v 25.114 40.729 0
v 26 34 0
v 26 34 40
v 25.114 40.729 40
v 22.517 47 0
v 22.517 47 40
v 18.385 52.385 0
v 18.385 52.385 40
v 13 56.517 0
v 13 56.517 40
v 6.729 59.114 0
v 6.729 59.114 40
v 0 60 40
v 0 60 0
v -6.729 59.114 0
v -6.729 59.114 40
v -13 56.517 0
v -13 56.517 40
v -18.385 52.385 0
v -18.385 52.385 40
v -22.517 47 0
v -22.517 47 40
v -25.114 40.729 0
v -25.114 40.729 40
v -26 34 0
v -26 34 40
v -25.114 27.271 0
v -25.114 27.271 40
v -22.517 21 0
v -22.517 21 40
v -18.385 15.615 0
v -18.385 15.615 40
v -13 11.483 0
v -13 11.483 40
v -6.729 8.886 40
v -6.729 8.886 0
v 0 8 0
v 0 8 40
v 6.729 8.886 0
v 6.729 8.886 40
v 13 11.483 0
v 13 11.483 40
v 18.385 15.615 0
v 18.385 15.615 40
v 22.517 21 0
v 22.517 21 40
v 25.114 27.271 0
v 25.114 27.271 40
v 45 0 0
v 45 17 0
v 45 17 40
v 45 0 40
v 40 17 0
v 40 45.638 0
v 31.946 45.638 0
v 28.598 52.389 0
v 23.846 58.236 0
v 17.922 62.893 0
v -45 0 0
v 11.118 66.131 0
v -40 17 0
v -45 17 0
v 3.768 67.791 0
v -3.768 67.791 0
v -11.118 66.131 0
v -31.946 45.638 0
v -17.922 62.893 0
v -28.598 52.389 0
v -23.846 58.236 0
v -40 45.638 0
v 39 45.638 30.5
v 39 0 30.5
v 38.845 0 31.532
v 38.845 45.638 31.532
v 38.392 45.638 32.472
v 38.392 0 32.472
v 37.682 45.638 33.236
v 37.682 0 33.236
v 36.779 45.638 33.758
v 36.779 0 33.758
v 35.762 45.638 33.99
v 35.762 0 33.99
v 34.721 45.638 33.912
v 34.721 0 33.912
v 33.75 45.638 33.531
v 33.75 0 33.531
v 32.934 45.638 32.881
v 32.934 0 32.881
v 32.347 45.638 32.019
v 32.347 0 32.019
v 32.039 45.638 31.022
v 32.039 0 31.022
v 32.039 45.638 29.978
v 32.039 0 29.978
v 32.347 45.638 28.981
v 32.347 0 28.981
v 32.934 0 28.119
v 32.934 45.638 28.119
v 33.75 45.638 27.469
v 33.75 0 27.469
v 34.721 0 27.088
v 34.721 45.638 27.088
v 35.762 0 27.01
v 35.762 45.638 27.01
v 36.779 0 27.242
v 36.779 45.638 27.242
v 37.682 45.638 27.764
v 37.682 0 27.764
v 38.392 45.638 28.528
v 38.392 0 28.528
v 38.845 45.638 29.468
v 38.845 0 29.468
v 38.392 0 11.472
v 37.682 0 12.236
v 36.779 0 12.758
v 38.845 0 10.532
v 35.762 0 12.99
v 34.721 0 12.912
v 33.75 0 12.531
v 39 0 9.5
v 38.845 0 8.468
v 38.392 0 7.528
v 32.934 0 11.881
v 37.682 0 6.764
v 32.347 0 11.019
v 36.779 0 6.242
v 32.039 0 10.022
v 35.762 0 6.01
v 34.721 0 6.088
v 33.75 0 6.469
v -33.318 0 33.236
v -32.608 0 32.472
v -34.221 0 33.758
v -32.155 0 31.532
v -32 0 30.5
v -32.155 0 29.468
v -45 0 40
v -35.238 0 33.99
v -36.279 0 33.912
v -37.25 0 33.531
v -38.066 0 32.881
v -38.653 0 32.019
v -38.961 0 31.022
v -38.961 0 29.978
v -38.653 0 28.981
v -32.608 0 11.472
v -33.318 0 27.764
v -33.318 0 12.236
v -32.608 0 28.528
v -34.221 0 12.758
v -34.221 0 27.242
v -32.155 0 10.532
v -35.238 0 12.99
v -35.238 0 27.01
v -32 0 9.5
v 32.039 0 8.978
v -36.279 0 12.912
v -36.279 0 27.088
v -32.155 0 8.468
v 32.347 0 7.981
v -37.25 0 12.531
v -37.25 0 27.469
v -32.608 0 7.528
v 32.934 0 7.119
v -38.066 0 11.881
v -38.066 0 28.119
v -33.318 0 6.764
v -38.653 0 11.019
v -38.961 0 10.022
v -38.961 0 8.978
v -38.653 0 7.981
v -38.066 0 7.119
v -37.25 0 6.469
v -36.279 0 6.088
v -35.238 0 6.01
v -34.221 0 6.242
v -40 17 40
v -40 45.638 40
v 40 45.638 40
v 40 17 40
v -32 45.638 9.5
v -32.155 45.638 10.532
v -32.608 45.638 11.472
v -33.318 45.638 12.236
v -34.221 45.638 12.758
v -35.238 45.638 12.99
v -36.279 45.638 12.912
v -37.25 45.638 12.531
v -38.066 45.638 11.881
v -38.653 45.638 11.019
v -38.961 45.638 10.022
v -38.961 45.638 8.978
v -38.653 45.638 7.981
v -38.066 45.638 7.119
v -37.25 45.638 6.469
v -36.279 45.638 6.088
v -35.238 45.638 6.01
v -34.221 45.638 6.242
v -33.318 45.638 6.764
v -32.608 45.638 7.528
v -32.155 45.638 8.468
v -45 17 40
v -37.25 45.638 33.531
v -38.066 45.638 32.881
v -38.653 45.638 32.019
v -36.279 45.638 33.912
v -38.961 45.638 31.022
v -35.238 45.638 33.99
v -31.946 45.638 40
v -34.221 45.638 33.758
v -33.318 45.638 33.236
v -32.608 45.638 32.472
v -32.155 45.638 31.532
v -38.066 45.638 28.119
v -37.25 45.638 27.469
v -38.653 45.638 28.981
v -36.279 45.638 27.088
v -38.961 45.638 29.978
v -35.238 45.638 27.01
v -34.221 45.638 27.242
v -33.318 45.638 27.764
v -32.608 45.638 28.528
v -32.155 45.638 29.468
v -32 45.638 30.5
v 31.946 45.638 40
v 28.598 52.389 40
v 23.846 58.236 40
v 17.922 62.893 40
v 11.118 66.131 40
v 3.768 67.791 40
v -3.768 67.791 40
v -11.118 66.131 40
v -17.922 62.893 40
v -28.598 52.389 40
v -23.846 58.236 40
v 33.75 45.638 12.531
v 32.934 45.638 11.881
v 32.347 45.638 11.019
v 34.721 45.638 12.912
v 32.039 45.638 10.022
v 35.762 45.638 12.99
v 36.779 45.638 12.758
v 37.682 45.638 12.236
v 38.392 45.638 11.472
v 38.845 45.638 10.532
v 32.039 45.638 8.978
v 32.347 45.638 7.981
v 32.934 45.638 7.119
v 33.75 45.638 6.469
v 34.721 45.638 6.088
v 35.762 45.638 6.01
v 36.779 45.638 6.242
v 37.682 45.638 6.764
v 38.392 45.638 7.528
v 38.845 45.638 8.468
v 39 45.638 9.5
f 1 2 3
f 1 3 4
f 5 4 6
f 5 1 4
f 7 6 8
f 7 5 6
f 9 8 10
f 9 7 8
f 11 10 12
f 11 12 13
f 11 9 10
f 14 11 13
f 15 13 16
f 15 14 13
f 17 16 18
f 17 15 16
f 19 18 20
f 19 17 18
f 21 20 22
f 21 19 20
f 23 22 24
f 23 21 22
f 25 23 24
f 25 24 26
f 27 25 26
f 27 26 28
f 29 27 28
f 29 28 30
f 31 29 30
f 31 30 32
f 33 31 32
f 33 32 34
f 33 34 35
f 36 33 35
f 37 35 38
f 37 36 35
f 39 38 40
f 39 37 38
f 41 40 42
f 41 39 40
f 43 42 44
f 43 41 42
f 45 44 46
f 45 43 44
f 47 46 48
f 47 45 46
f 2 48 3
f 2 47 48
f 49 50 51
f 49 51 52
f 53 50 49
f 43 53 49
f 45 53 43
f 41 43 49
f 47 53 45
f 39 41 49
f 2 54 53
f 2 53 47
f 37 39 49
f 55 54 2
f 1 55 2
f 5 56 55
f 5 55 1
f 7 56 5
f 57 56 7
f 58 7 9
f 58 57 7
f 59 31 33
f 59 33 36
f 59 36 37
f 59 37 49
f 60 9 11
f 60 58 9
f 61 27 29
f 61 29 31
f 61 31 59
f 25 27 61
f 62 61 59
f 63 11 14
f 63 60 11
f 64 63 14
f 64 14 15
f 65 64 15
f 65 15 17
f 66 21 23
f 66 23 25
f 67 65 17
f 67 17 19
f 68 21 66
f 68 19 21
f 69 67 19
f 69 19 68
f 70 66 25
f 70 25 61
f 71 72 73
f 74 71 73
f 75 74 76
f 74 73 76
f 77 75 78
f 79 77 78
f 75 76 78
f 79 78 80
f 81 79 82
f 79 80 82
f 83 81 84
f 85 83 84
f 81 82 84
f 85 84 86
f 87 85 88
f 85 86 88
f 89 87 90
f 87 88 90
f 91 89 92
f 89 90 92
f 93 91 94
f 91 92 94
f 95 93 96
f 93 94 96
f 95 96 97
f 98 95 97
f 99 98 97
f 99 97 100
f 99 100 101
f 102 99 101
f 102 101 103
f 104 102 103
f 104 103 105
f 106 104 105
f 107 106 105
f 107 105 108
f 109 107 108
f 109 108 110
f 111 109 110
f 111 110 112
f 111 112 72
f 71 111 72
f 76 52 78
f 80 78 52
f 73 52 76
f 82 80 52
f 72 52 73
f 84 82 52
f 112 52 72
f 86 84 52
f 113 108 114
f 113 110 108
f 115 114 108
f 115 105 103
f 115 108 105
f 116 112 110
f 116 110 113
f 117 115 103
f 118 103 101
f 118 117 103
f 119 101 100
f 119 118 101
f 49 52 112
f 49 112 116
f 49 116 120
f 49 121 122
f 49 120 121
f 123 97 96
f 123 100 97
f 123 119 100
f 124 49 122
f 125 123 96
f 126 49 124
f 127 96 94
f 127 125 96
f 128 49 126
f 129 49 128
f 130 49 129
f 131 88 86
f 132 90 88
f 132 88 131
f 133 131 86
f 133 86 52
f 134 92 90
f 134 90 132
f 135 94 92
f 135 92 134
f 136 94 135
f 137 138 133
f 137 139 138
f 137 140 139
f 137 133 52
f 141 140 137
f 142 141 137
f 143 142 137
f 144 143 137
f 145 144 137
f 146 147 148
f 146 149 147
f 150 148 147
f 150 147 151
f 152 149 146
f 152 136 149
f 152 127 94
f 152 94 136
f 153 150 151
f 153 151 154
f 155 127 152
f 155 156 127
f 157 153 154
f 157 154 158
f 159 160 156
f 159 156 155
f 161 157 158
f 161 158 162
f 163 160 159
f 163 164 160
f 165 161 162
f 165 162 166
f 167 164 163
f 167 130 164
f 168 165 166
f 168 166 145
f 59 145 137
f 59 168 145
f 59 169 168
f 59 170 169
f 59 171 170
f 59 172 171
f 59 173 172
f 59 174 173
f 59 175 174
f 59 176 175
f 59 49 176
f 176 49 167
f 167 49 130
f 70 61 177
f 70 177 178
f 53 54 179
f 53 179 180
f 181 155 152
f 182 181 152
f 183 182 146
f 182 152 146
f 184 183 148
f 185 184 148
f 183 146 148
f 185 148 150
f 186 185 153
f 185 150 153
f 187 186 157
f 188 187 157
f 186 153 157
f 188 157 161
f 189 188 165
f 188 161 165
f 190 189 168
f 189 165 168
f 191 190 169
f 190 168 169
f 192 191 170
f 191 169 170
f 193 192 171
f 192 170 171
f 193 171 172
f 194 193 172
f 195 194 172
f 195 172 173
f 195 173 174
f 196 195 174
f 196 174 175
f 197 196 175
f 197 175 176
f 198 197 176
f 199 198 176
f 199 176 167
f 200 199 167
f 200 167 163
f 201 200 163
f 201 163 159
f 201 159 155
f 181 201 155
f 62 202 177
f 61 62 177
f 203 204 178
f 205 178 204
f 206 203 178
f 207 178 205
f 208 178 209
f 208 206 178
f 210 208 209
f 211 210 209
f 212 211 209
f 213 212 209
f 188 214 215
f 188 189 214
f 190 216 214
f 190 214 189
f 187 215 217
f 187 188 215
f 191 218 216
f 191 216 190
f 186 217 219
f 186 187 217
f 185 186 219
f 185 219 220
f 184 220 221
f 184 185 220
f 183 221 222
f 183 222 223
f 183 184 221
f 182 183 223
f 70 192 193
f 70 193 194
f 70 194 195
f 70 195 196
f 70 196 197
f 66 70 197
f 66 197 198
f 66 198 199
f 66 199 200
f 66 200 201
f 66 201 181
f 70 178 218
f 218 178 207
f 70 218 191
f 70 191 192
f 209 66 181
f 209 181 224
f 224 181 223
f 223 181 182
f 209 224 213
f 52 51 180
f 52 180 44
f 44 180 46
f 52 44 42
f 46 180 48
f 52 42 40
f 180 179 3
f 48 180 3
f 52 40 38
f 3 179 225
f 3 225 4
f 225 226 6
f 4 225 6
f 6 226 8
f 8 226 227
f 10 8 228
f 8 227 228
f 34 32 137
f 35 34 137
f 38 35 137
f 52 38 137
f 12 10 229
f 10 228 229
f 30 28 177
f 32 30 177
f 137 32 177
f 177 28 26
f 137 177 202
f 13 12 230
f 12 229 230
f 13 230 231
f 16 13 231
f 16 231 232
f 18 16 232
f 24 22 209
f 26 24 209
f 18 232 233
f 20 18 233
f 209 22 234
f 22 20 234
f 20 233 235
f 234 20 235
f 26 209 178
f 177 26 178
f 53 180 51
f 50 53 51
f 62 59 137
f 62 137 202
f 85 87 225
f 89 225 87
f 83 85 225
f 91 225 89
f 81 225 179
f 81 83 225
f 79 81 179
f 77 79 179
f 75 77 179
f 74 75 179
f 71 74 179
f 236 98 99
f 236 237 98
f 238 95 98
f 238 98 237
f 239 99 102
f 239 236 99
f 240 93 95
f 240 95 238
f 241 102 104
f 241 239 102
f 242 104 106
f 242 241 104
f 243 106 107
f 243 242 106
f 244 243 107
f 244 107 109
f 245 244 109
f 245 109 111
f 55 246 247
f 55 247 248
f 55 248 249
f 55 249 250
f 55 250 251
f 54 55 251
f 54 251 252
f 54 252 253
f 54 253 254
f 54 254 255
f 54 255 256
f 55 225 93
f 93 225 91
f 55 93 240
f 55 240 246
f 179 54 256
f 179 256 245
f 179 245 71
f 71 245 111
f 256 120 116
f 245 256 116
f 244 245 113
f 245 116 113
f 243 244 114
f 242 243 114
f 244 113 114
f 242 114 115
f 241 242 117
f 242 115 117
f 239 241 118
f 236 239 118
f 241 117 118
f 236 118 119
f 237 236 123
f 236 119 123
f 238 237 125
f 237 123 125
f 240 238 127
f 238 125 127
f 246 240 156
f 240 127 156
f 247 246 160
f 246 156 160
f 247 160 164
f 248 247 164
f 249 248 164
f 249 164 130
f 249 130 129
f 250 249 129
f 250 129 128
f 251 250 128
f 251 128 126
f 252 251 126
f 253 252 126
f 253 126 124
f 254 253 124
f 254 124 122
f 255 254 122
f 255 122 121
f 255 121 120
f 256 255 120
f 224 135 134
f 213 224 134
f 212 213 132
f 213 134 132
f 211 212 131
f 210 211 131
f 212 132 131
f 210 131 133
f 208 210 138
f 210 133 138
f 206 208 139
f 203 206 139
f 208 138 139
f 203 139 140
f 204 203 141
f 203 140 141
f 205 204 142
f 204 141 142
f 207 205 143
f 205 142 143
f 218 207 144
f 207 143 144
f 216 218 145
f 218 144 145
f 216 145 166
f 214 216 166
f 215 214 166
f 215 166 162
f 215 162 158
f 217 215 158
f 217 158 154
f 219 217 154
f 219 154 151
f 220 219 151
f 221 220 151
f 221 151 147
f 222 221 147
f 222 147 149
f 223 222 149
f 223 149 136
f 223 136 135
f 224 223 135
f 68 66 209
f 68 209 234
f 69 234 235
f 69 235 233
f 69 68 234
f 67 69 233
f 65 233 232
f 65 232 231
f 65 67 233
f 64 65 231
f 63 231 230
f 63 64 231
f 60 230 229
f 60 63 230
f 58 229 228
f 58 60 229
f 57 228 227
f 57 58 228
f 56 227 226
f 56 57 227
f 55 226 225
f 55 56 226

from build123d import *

# Parameters (mm, degrees)
SKETCH1_R           = 26
BOSS_EXTRUDE1_DEPTH = 40
SKETCH2_R           = 3.5
CUT_EXTRUDE1_DEPTH  = 100


with BuildPart() as part:
    # Sketch1 → Boss-Extrude1 (new body)
    with BuildSketch(Plane.XY):
        with BuildLine():
            Line((40, 17), (45, 17))
            Line((45, 17), (45, 0))
            Line((45, 0), (-45, 0))
            Line((-45, 0), (-45, 17))
            Line((-45, 17), (-40, 17))
            Line((-40, 17), (-40, 45.637906937))
            Line((-40, 45.637906937), (-31.946191042, 45.637906937))
            ThreePointArc((-31.946191042, 45.637906937), (0, 68), (31.946191042, 45.637906937))
            Line((31.946191042, 45.637906937), (40, 45.637906937))
            Line((40, 45.637906937), (40, 17))
        make_face()
        with Locations((0, 34)):
            Circle(SKETCH1_R, mode=Mode.SUBTRACT)
    extrude(amount=BOSS_EXTRUDE1_DEPTH)

    # Sketch2 → Cut-Extrude1 (cut)
    with BuildSketch(Plane.XZ):
        with Locations((-35.5, 30.5)):
            Circle(SKETCH2_R)
        with Locations((-35.5, 9.5)):
            Circle(SKETCH2_R)
        with Locations((35.5, 30.5)):
            Circle(SKETCH2_R)
        with Locations((35.5, 9.5)):
            Circle(SKETCH2_R)
    extrude(amount=-CUT_EXTRUDE1_DEPTH, mode=Mode.SUBTRACT)


solid = part.part
